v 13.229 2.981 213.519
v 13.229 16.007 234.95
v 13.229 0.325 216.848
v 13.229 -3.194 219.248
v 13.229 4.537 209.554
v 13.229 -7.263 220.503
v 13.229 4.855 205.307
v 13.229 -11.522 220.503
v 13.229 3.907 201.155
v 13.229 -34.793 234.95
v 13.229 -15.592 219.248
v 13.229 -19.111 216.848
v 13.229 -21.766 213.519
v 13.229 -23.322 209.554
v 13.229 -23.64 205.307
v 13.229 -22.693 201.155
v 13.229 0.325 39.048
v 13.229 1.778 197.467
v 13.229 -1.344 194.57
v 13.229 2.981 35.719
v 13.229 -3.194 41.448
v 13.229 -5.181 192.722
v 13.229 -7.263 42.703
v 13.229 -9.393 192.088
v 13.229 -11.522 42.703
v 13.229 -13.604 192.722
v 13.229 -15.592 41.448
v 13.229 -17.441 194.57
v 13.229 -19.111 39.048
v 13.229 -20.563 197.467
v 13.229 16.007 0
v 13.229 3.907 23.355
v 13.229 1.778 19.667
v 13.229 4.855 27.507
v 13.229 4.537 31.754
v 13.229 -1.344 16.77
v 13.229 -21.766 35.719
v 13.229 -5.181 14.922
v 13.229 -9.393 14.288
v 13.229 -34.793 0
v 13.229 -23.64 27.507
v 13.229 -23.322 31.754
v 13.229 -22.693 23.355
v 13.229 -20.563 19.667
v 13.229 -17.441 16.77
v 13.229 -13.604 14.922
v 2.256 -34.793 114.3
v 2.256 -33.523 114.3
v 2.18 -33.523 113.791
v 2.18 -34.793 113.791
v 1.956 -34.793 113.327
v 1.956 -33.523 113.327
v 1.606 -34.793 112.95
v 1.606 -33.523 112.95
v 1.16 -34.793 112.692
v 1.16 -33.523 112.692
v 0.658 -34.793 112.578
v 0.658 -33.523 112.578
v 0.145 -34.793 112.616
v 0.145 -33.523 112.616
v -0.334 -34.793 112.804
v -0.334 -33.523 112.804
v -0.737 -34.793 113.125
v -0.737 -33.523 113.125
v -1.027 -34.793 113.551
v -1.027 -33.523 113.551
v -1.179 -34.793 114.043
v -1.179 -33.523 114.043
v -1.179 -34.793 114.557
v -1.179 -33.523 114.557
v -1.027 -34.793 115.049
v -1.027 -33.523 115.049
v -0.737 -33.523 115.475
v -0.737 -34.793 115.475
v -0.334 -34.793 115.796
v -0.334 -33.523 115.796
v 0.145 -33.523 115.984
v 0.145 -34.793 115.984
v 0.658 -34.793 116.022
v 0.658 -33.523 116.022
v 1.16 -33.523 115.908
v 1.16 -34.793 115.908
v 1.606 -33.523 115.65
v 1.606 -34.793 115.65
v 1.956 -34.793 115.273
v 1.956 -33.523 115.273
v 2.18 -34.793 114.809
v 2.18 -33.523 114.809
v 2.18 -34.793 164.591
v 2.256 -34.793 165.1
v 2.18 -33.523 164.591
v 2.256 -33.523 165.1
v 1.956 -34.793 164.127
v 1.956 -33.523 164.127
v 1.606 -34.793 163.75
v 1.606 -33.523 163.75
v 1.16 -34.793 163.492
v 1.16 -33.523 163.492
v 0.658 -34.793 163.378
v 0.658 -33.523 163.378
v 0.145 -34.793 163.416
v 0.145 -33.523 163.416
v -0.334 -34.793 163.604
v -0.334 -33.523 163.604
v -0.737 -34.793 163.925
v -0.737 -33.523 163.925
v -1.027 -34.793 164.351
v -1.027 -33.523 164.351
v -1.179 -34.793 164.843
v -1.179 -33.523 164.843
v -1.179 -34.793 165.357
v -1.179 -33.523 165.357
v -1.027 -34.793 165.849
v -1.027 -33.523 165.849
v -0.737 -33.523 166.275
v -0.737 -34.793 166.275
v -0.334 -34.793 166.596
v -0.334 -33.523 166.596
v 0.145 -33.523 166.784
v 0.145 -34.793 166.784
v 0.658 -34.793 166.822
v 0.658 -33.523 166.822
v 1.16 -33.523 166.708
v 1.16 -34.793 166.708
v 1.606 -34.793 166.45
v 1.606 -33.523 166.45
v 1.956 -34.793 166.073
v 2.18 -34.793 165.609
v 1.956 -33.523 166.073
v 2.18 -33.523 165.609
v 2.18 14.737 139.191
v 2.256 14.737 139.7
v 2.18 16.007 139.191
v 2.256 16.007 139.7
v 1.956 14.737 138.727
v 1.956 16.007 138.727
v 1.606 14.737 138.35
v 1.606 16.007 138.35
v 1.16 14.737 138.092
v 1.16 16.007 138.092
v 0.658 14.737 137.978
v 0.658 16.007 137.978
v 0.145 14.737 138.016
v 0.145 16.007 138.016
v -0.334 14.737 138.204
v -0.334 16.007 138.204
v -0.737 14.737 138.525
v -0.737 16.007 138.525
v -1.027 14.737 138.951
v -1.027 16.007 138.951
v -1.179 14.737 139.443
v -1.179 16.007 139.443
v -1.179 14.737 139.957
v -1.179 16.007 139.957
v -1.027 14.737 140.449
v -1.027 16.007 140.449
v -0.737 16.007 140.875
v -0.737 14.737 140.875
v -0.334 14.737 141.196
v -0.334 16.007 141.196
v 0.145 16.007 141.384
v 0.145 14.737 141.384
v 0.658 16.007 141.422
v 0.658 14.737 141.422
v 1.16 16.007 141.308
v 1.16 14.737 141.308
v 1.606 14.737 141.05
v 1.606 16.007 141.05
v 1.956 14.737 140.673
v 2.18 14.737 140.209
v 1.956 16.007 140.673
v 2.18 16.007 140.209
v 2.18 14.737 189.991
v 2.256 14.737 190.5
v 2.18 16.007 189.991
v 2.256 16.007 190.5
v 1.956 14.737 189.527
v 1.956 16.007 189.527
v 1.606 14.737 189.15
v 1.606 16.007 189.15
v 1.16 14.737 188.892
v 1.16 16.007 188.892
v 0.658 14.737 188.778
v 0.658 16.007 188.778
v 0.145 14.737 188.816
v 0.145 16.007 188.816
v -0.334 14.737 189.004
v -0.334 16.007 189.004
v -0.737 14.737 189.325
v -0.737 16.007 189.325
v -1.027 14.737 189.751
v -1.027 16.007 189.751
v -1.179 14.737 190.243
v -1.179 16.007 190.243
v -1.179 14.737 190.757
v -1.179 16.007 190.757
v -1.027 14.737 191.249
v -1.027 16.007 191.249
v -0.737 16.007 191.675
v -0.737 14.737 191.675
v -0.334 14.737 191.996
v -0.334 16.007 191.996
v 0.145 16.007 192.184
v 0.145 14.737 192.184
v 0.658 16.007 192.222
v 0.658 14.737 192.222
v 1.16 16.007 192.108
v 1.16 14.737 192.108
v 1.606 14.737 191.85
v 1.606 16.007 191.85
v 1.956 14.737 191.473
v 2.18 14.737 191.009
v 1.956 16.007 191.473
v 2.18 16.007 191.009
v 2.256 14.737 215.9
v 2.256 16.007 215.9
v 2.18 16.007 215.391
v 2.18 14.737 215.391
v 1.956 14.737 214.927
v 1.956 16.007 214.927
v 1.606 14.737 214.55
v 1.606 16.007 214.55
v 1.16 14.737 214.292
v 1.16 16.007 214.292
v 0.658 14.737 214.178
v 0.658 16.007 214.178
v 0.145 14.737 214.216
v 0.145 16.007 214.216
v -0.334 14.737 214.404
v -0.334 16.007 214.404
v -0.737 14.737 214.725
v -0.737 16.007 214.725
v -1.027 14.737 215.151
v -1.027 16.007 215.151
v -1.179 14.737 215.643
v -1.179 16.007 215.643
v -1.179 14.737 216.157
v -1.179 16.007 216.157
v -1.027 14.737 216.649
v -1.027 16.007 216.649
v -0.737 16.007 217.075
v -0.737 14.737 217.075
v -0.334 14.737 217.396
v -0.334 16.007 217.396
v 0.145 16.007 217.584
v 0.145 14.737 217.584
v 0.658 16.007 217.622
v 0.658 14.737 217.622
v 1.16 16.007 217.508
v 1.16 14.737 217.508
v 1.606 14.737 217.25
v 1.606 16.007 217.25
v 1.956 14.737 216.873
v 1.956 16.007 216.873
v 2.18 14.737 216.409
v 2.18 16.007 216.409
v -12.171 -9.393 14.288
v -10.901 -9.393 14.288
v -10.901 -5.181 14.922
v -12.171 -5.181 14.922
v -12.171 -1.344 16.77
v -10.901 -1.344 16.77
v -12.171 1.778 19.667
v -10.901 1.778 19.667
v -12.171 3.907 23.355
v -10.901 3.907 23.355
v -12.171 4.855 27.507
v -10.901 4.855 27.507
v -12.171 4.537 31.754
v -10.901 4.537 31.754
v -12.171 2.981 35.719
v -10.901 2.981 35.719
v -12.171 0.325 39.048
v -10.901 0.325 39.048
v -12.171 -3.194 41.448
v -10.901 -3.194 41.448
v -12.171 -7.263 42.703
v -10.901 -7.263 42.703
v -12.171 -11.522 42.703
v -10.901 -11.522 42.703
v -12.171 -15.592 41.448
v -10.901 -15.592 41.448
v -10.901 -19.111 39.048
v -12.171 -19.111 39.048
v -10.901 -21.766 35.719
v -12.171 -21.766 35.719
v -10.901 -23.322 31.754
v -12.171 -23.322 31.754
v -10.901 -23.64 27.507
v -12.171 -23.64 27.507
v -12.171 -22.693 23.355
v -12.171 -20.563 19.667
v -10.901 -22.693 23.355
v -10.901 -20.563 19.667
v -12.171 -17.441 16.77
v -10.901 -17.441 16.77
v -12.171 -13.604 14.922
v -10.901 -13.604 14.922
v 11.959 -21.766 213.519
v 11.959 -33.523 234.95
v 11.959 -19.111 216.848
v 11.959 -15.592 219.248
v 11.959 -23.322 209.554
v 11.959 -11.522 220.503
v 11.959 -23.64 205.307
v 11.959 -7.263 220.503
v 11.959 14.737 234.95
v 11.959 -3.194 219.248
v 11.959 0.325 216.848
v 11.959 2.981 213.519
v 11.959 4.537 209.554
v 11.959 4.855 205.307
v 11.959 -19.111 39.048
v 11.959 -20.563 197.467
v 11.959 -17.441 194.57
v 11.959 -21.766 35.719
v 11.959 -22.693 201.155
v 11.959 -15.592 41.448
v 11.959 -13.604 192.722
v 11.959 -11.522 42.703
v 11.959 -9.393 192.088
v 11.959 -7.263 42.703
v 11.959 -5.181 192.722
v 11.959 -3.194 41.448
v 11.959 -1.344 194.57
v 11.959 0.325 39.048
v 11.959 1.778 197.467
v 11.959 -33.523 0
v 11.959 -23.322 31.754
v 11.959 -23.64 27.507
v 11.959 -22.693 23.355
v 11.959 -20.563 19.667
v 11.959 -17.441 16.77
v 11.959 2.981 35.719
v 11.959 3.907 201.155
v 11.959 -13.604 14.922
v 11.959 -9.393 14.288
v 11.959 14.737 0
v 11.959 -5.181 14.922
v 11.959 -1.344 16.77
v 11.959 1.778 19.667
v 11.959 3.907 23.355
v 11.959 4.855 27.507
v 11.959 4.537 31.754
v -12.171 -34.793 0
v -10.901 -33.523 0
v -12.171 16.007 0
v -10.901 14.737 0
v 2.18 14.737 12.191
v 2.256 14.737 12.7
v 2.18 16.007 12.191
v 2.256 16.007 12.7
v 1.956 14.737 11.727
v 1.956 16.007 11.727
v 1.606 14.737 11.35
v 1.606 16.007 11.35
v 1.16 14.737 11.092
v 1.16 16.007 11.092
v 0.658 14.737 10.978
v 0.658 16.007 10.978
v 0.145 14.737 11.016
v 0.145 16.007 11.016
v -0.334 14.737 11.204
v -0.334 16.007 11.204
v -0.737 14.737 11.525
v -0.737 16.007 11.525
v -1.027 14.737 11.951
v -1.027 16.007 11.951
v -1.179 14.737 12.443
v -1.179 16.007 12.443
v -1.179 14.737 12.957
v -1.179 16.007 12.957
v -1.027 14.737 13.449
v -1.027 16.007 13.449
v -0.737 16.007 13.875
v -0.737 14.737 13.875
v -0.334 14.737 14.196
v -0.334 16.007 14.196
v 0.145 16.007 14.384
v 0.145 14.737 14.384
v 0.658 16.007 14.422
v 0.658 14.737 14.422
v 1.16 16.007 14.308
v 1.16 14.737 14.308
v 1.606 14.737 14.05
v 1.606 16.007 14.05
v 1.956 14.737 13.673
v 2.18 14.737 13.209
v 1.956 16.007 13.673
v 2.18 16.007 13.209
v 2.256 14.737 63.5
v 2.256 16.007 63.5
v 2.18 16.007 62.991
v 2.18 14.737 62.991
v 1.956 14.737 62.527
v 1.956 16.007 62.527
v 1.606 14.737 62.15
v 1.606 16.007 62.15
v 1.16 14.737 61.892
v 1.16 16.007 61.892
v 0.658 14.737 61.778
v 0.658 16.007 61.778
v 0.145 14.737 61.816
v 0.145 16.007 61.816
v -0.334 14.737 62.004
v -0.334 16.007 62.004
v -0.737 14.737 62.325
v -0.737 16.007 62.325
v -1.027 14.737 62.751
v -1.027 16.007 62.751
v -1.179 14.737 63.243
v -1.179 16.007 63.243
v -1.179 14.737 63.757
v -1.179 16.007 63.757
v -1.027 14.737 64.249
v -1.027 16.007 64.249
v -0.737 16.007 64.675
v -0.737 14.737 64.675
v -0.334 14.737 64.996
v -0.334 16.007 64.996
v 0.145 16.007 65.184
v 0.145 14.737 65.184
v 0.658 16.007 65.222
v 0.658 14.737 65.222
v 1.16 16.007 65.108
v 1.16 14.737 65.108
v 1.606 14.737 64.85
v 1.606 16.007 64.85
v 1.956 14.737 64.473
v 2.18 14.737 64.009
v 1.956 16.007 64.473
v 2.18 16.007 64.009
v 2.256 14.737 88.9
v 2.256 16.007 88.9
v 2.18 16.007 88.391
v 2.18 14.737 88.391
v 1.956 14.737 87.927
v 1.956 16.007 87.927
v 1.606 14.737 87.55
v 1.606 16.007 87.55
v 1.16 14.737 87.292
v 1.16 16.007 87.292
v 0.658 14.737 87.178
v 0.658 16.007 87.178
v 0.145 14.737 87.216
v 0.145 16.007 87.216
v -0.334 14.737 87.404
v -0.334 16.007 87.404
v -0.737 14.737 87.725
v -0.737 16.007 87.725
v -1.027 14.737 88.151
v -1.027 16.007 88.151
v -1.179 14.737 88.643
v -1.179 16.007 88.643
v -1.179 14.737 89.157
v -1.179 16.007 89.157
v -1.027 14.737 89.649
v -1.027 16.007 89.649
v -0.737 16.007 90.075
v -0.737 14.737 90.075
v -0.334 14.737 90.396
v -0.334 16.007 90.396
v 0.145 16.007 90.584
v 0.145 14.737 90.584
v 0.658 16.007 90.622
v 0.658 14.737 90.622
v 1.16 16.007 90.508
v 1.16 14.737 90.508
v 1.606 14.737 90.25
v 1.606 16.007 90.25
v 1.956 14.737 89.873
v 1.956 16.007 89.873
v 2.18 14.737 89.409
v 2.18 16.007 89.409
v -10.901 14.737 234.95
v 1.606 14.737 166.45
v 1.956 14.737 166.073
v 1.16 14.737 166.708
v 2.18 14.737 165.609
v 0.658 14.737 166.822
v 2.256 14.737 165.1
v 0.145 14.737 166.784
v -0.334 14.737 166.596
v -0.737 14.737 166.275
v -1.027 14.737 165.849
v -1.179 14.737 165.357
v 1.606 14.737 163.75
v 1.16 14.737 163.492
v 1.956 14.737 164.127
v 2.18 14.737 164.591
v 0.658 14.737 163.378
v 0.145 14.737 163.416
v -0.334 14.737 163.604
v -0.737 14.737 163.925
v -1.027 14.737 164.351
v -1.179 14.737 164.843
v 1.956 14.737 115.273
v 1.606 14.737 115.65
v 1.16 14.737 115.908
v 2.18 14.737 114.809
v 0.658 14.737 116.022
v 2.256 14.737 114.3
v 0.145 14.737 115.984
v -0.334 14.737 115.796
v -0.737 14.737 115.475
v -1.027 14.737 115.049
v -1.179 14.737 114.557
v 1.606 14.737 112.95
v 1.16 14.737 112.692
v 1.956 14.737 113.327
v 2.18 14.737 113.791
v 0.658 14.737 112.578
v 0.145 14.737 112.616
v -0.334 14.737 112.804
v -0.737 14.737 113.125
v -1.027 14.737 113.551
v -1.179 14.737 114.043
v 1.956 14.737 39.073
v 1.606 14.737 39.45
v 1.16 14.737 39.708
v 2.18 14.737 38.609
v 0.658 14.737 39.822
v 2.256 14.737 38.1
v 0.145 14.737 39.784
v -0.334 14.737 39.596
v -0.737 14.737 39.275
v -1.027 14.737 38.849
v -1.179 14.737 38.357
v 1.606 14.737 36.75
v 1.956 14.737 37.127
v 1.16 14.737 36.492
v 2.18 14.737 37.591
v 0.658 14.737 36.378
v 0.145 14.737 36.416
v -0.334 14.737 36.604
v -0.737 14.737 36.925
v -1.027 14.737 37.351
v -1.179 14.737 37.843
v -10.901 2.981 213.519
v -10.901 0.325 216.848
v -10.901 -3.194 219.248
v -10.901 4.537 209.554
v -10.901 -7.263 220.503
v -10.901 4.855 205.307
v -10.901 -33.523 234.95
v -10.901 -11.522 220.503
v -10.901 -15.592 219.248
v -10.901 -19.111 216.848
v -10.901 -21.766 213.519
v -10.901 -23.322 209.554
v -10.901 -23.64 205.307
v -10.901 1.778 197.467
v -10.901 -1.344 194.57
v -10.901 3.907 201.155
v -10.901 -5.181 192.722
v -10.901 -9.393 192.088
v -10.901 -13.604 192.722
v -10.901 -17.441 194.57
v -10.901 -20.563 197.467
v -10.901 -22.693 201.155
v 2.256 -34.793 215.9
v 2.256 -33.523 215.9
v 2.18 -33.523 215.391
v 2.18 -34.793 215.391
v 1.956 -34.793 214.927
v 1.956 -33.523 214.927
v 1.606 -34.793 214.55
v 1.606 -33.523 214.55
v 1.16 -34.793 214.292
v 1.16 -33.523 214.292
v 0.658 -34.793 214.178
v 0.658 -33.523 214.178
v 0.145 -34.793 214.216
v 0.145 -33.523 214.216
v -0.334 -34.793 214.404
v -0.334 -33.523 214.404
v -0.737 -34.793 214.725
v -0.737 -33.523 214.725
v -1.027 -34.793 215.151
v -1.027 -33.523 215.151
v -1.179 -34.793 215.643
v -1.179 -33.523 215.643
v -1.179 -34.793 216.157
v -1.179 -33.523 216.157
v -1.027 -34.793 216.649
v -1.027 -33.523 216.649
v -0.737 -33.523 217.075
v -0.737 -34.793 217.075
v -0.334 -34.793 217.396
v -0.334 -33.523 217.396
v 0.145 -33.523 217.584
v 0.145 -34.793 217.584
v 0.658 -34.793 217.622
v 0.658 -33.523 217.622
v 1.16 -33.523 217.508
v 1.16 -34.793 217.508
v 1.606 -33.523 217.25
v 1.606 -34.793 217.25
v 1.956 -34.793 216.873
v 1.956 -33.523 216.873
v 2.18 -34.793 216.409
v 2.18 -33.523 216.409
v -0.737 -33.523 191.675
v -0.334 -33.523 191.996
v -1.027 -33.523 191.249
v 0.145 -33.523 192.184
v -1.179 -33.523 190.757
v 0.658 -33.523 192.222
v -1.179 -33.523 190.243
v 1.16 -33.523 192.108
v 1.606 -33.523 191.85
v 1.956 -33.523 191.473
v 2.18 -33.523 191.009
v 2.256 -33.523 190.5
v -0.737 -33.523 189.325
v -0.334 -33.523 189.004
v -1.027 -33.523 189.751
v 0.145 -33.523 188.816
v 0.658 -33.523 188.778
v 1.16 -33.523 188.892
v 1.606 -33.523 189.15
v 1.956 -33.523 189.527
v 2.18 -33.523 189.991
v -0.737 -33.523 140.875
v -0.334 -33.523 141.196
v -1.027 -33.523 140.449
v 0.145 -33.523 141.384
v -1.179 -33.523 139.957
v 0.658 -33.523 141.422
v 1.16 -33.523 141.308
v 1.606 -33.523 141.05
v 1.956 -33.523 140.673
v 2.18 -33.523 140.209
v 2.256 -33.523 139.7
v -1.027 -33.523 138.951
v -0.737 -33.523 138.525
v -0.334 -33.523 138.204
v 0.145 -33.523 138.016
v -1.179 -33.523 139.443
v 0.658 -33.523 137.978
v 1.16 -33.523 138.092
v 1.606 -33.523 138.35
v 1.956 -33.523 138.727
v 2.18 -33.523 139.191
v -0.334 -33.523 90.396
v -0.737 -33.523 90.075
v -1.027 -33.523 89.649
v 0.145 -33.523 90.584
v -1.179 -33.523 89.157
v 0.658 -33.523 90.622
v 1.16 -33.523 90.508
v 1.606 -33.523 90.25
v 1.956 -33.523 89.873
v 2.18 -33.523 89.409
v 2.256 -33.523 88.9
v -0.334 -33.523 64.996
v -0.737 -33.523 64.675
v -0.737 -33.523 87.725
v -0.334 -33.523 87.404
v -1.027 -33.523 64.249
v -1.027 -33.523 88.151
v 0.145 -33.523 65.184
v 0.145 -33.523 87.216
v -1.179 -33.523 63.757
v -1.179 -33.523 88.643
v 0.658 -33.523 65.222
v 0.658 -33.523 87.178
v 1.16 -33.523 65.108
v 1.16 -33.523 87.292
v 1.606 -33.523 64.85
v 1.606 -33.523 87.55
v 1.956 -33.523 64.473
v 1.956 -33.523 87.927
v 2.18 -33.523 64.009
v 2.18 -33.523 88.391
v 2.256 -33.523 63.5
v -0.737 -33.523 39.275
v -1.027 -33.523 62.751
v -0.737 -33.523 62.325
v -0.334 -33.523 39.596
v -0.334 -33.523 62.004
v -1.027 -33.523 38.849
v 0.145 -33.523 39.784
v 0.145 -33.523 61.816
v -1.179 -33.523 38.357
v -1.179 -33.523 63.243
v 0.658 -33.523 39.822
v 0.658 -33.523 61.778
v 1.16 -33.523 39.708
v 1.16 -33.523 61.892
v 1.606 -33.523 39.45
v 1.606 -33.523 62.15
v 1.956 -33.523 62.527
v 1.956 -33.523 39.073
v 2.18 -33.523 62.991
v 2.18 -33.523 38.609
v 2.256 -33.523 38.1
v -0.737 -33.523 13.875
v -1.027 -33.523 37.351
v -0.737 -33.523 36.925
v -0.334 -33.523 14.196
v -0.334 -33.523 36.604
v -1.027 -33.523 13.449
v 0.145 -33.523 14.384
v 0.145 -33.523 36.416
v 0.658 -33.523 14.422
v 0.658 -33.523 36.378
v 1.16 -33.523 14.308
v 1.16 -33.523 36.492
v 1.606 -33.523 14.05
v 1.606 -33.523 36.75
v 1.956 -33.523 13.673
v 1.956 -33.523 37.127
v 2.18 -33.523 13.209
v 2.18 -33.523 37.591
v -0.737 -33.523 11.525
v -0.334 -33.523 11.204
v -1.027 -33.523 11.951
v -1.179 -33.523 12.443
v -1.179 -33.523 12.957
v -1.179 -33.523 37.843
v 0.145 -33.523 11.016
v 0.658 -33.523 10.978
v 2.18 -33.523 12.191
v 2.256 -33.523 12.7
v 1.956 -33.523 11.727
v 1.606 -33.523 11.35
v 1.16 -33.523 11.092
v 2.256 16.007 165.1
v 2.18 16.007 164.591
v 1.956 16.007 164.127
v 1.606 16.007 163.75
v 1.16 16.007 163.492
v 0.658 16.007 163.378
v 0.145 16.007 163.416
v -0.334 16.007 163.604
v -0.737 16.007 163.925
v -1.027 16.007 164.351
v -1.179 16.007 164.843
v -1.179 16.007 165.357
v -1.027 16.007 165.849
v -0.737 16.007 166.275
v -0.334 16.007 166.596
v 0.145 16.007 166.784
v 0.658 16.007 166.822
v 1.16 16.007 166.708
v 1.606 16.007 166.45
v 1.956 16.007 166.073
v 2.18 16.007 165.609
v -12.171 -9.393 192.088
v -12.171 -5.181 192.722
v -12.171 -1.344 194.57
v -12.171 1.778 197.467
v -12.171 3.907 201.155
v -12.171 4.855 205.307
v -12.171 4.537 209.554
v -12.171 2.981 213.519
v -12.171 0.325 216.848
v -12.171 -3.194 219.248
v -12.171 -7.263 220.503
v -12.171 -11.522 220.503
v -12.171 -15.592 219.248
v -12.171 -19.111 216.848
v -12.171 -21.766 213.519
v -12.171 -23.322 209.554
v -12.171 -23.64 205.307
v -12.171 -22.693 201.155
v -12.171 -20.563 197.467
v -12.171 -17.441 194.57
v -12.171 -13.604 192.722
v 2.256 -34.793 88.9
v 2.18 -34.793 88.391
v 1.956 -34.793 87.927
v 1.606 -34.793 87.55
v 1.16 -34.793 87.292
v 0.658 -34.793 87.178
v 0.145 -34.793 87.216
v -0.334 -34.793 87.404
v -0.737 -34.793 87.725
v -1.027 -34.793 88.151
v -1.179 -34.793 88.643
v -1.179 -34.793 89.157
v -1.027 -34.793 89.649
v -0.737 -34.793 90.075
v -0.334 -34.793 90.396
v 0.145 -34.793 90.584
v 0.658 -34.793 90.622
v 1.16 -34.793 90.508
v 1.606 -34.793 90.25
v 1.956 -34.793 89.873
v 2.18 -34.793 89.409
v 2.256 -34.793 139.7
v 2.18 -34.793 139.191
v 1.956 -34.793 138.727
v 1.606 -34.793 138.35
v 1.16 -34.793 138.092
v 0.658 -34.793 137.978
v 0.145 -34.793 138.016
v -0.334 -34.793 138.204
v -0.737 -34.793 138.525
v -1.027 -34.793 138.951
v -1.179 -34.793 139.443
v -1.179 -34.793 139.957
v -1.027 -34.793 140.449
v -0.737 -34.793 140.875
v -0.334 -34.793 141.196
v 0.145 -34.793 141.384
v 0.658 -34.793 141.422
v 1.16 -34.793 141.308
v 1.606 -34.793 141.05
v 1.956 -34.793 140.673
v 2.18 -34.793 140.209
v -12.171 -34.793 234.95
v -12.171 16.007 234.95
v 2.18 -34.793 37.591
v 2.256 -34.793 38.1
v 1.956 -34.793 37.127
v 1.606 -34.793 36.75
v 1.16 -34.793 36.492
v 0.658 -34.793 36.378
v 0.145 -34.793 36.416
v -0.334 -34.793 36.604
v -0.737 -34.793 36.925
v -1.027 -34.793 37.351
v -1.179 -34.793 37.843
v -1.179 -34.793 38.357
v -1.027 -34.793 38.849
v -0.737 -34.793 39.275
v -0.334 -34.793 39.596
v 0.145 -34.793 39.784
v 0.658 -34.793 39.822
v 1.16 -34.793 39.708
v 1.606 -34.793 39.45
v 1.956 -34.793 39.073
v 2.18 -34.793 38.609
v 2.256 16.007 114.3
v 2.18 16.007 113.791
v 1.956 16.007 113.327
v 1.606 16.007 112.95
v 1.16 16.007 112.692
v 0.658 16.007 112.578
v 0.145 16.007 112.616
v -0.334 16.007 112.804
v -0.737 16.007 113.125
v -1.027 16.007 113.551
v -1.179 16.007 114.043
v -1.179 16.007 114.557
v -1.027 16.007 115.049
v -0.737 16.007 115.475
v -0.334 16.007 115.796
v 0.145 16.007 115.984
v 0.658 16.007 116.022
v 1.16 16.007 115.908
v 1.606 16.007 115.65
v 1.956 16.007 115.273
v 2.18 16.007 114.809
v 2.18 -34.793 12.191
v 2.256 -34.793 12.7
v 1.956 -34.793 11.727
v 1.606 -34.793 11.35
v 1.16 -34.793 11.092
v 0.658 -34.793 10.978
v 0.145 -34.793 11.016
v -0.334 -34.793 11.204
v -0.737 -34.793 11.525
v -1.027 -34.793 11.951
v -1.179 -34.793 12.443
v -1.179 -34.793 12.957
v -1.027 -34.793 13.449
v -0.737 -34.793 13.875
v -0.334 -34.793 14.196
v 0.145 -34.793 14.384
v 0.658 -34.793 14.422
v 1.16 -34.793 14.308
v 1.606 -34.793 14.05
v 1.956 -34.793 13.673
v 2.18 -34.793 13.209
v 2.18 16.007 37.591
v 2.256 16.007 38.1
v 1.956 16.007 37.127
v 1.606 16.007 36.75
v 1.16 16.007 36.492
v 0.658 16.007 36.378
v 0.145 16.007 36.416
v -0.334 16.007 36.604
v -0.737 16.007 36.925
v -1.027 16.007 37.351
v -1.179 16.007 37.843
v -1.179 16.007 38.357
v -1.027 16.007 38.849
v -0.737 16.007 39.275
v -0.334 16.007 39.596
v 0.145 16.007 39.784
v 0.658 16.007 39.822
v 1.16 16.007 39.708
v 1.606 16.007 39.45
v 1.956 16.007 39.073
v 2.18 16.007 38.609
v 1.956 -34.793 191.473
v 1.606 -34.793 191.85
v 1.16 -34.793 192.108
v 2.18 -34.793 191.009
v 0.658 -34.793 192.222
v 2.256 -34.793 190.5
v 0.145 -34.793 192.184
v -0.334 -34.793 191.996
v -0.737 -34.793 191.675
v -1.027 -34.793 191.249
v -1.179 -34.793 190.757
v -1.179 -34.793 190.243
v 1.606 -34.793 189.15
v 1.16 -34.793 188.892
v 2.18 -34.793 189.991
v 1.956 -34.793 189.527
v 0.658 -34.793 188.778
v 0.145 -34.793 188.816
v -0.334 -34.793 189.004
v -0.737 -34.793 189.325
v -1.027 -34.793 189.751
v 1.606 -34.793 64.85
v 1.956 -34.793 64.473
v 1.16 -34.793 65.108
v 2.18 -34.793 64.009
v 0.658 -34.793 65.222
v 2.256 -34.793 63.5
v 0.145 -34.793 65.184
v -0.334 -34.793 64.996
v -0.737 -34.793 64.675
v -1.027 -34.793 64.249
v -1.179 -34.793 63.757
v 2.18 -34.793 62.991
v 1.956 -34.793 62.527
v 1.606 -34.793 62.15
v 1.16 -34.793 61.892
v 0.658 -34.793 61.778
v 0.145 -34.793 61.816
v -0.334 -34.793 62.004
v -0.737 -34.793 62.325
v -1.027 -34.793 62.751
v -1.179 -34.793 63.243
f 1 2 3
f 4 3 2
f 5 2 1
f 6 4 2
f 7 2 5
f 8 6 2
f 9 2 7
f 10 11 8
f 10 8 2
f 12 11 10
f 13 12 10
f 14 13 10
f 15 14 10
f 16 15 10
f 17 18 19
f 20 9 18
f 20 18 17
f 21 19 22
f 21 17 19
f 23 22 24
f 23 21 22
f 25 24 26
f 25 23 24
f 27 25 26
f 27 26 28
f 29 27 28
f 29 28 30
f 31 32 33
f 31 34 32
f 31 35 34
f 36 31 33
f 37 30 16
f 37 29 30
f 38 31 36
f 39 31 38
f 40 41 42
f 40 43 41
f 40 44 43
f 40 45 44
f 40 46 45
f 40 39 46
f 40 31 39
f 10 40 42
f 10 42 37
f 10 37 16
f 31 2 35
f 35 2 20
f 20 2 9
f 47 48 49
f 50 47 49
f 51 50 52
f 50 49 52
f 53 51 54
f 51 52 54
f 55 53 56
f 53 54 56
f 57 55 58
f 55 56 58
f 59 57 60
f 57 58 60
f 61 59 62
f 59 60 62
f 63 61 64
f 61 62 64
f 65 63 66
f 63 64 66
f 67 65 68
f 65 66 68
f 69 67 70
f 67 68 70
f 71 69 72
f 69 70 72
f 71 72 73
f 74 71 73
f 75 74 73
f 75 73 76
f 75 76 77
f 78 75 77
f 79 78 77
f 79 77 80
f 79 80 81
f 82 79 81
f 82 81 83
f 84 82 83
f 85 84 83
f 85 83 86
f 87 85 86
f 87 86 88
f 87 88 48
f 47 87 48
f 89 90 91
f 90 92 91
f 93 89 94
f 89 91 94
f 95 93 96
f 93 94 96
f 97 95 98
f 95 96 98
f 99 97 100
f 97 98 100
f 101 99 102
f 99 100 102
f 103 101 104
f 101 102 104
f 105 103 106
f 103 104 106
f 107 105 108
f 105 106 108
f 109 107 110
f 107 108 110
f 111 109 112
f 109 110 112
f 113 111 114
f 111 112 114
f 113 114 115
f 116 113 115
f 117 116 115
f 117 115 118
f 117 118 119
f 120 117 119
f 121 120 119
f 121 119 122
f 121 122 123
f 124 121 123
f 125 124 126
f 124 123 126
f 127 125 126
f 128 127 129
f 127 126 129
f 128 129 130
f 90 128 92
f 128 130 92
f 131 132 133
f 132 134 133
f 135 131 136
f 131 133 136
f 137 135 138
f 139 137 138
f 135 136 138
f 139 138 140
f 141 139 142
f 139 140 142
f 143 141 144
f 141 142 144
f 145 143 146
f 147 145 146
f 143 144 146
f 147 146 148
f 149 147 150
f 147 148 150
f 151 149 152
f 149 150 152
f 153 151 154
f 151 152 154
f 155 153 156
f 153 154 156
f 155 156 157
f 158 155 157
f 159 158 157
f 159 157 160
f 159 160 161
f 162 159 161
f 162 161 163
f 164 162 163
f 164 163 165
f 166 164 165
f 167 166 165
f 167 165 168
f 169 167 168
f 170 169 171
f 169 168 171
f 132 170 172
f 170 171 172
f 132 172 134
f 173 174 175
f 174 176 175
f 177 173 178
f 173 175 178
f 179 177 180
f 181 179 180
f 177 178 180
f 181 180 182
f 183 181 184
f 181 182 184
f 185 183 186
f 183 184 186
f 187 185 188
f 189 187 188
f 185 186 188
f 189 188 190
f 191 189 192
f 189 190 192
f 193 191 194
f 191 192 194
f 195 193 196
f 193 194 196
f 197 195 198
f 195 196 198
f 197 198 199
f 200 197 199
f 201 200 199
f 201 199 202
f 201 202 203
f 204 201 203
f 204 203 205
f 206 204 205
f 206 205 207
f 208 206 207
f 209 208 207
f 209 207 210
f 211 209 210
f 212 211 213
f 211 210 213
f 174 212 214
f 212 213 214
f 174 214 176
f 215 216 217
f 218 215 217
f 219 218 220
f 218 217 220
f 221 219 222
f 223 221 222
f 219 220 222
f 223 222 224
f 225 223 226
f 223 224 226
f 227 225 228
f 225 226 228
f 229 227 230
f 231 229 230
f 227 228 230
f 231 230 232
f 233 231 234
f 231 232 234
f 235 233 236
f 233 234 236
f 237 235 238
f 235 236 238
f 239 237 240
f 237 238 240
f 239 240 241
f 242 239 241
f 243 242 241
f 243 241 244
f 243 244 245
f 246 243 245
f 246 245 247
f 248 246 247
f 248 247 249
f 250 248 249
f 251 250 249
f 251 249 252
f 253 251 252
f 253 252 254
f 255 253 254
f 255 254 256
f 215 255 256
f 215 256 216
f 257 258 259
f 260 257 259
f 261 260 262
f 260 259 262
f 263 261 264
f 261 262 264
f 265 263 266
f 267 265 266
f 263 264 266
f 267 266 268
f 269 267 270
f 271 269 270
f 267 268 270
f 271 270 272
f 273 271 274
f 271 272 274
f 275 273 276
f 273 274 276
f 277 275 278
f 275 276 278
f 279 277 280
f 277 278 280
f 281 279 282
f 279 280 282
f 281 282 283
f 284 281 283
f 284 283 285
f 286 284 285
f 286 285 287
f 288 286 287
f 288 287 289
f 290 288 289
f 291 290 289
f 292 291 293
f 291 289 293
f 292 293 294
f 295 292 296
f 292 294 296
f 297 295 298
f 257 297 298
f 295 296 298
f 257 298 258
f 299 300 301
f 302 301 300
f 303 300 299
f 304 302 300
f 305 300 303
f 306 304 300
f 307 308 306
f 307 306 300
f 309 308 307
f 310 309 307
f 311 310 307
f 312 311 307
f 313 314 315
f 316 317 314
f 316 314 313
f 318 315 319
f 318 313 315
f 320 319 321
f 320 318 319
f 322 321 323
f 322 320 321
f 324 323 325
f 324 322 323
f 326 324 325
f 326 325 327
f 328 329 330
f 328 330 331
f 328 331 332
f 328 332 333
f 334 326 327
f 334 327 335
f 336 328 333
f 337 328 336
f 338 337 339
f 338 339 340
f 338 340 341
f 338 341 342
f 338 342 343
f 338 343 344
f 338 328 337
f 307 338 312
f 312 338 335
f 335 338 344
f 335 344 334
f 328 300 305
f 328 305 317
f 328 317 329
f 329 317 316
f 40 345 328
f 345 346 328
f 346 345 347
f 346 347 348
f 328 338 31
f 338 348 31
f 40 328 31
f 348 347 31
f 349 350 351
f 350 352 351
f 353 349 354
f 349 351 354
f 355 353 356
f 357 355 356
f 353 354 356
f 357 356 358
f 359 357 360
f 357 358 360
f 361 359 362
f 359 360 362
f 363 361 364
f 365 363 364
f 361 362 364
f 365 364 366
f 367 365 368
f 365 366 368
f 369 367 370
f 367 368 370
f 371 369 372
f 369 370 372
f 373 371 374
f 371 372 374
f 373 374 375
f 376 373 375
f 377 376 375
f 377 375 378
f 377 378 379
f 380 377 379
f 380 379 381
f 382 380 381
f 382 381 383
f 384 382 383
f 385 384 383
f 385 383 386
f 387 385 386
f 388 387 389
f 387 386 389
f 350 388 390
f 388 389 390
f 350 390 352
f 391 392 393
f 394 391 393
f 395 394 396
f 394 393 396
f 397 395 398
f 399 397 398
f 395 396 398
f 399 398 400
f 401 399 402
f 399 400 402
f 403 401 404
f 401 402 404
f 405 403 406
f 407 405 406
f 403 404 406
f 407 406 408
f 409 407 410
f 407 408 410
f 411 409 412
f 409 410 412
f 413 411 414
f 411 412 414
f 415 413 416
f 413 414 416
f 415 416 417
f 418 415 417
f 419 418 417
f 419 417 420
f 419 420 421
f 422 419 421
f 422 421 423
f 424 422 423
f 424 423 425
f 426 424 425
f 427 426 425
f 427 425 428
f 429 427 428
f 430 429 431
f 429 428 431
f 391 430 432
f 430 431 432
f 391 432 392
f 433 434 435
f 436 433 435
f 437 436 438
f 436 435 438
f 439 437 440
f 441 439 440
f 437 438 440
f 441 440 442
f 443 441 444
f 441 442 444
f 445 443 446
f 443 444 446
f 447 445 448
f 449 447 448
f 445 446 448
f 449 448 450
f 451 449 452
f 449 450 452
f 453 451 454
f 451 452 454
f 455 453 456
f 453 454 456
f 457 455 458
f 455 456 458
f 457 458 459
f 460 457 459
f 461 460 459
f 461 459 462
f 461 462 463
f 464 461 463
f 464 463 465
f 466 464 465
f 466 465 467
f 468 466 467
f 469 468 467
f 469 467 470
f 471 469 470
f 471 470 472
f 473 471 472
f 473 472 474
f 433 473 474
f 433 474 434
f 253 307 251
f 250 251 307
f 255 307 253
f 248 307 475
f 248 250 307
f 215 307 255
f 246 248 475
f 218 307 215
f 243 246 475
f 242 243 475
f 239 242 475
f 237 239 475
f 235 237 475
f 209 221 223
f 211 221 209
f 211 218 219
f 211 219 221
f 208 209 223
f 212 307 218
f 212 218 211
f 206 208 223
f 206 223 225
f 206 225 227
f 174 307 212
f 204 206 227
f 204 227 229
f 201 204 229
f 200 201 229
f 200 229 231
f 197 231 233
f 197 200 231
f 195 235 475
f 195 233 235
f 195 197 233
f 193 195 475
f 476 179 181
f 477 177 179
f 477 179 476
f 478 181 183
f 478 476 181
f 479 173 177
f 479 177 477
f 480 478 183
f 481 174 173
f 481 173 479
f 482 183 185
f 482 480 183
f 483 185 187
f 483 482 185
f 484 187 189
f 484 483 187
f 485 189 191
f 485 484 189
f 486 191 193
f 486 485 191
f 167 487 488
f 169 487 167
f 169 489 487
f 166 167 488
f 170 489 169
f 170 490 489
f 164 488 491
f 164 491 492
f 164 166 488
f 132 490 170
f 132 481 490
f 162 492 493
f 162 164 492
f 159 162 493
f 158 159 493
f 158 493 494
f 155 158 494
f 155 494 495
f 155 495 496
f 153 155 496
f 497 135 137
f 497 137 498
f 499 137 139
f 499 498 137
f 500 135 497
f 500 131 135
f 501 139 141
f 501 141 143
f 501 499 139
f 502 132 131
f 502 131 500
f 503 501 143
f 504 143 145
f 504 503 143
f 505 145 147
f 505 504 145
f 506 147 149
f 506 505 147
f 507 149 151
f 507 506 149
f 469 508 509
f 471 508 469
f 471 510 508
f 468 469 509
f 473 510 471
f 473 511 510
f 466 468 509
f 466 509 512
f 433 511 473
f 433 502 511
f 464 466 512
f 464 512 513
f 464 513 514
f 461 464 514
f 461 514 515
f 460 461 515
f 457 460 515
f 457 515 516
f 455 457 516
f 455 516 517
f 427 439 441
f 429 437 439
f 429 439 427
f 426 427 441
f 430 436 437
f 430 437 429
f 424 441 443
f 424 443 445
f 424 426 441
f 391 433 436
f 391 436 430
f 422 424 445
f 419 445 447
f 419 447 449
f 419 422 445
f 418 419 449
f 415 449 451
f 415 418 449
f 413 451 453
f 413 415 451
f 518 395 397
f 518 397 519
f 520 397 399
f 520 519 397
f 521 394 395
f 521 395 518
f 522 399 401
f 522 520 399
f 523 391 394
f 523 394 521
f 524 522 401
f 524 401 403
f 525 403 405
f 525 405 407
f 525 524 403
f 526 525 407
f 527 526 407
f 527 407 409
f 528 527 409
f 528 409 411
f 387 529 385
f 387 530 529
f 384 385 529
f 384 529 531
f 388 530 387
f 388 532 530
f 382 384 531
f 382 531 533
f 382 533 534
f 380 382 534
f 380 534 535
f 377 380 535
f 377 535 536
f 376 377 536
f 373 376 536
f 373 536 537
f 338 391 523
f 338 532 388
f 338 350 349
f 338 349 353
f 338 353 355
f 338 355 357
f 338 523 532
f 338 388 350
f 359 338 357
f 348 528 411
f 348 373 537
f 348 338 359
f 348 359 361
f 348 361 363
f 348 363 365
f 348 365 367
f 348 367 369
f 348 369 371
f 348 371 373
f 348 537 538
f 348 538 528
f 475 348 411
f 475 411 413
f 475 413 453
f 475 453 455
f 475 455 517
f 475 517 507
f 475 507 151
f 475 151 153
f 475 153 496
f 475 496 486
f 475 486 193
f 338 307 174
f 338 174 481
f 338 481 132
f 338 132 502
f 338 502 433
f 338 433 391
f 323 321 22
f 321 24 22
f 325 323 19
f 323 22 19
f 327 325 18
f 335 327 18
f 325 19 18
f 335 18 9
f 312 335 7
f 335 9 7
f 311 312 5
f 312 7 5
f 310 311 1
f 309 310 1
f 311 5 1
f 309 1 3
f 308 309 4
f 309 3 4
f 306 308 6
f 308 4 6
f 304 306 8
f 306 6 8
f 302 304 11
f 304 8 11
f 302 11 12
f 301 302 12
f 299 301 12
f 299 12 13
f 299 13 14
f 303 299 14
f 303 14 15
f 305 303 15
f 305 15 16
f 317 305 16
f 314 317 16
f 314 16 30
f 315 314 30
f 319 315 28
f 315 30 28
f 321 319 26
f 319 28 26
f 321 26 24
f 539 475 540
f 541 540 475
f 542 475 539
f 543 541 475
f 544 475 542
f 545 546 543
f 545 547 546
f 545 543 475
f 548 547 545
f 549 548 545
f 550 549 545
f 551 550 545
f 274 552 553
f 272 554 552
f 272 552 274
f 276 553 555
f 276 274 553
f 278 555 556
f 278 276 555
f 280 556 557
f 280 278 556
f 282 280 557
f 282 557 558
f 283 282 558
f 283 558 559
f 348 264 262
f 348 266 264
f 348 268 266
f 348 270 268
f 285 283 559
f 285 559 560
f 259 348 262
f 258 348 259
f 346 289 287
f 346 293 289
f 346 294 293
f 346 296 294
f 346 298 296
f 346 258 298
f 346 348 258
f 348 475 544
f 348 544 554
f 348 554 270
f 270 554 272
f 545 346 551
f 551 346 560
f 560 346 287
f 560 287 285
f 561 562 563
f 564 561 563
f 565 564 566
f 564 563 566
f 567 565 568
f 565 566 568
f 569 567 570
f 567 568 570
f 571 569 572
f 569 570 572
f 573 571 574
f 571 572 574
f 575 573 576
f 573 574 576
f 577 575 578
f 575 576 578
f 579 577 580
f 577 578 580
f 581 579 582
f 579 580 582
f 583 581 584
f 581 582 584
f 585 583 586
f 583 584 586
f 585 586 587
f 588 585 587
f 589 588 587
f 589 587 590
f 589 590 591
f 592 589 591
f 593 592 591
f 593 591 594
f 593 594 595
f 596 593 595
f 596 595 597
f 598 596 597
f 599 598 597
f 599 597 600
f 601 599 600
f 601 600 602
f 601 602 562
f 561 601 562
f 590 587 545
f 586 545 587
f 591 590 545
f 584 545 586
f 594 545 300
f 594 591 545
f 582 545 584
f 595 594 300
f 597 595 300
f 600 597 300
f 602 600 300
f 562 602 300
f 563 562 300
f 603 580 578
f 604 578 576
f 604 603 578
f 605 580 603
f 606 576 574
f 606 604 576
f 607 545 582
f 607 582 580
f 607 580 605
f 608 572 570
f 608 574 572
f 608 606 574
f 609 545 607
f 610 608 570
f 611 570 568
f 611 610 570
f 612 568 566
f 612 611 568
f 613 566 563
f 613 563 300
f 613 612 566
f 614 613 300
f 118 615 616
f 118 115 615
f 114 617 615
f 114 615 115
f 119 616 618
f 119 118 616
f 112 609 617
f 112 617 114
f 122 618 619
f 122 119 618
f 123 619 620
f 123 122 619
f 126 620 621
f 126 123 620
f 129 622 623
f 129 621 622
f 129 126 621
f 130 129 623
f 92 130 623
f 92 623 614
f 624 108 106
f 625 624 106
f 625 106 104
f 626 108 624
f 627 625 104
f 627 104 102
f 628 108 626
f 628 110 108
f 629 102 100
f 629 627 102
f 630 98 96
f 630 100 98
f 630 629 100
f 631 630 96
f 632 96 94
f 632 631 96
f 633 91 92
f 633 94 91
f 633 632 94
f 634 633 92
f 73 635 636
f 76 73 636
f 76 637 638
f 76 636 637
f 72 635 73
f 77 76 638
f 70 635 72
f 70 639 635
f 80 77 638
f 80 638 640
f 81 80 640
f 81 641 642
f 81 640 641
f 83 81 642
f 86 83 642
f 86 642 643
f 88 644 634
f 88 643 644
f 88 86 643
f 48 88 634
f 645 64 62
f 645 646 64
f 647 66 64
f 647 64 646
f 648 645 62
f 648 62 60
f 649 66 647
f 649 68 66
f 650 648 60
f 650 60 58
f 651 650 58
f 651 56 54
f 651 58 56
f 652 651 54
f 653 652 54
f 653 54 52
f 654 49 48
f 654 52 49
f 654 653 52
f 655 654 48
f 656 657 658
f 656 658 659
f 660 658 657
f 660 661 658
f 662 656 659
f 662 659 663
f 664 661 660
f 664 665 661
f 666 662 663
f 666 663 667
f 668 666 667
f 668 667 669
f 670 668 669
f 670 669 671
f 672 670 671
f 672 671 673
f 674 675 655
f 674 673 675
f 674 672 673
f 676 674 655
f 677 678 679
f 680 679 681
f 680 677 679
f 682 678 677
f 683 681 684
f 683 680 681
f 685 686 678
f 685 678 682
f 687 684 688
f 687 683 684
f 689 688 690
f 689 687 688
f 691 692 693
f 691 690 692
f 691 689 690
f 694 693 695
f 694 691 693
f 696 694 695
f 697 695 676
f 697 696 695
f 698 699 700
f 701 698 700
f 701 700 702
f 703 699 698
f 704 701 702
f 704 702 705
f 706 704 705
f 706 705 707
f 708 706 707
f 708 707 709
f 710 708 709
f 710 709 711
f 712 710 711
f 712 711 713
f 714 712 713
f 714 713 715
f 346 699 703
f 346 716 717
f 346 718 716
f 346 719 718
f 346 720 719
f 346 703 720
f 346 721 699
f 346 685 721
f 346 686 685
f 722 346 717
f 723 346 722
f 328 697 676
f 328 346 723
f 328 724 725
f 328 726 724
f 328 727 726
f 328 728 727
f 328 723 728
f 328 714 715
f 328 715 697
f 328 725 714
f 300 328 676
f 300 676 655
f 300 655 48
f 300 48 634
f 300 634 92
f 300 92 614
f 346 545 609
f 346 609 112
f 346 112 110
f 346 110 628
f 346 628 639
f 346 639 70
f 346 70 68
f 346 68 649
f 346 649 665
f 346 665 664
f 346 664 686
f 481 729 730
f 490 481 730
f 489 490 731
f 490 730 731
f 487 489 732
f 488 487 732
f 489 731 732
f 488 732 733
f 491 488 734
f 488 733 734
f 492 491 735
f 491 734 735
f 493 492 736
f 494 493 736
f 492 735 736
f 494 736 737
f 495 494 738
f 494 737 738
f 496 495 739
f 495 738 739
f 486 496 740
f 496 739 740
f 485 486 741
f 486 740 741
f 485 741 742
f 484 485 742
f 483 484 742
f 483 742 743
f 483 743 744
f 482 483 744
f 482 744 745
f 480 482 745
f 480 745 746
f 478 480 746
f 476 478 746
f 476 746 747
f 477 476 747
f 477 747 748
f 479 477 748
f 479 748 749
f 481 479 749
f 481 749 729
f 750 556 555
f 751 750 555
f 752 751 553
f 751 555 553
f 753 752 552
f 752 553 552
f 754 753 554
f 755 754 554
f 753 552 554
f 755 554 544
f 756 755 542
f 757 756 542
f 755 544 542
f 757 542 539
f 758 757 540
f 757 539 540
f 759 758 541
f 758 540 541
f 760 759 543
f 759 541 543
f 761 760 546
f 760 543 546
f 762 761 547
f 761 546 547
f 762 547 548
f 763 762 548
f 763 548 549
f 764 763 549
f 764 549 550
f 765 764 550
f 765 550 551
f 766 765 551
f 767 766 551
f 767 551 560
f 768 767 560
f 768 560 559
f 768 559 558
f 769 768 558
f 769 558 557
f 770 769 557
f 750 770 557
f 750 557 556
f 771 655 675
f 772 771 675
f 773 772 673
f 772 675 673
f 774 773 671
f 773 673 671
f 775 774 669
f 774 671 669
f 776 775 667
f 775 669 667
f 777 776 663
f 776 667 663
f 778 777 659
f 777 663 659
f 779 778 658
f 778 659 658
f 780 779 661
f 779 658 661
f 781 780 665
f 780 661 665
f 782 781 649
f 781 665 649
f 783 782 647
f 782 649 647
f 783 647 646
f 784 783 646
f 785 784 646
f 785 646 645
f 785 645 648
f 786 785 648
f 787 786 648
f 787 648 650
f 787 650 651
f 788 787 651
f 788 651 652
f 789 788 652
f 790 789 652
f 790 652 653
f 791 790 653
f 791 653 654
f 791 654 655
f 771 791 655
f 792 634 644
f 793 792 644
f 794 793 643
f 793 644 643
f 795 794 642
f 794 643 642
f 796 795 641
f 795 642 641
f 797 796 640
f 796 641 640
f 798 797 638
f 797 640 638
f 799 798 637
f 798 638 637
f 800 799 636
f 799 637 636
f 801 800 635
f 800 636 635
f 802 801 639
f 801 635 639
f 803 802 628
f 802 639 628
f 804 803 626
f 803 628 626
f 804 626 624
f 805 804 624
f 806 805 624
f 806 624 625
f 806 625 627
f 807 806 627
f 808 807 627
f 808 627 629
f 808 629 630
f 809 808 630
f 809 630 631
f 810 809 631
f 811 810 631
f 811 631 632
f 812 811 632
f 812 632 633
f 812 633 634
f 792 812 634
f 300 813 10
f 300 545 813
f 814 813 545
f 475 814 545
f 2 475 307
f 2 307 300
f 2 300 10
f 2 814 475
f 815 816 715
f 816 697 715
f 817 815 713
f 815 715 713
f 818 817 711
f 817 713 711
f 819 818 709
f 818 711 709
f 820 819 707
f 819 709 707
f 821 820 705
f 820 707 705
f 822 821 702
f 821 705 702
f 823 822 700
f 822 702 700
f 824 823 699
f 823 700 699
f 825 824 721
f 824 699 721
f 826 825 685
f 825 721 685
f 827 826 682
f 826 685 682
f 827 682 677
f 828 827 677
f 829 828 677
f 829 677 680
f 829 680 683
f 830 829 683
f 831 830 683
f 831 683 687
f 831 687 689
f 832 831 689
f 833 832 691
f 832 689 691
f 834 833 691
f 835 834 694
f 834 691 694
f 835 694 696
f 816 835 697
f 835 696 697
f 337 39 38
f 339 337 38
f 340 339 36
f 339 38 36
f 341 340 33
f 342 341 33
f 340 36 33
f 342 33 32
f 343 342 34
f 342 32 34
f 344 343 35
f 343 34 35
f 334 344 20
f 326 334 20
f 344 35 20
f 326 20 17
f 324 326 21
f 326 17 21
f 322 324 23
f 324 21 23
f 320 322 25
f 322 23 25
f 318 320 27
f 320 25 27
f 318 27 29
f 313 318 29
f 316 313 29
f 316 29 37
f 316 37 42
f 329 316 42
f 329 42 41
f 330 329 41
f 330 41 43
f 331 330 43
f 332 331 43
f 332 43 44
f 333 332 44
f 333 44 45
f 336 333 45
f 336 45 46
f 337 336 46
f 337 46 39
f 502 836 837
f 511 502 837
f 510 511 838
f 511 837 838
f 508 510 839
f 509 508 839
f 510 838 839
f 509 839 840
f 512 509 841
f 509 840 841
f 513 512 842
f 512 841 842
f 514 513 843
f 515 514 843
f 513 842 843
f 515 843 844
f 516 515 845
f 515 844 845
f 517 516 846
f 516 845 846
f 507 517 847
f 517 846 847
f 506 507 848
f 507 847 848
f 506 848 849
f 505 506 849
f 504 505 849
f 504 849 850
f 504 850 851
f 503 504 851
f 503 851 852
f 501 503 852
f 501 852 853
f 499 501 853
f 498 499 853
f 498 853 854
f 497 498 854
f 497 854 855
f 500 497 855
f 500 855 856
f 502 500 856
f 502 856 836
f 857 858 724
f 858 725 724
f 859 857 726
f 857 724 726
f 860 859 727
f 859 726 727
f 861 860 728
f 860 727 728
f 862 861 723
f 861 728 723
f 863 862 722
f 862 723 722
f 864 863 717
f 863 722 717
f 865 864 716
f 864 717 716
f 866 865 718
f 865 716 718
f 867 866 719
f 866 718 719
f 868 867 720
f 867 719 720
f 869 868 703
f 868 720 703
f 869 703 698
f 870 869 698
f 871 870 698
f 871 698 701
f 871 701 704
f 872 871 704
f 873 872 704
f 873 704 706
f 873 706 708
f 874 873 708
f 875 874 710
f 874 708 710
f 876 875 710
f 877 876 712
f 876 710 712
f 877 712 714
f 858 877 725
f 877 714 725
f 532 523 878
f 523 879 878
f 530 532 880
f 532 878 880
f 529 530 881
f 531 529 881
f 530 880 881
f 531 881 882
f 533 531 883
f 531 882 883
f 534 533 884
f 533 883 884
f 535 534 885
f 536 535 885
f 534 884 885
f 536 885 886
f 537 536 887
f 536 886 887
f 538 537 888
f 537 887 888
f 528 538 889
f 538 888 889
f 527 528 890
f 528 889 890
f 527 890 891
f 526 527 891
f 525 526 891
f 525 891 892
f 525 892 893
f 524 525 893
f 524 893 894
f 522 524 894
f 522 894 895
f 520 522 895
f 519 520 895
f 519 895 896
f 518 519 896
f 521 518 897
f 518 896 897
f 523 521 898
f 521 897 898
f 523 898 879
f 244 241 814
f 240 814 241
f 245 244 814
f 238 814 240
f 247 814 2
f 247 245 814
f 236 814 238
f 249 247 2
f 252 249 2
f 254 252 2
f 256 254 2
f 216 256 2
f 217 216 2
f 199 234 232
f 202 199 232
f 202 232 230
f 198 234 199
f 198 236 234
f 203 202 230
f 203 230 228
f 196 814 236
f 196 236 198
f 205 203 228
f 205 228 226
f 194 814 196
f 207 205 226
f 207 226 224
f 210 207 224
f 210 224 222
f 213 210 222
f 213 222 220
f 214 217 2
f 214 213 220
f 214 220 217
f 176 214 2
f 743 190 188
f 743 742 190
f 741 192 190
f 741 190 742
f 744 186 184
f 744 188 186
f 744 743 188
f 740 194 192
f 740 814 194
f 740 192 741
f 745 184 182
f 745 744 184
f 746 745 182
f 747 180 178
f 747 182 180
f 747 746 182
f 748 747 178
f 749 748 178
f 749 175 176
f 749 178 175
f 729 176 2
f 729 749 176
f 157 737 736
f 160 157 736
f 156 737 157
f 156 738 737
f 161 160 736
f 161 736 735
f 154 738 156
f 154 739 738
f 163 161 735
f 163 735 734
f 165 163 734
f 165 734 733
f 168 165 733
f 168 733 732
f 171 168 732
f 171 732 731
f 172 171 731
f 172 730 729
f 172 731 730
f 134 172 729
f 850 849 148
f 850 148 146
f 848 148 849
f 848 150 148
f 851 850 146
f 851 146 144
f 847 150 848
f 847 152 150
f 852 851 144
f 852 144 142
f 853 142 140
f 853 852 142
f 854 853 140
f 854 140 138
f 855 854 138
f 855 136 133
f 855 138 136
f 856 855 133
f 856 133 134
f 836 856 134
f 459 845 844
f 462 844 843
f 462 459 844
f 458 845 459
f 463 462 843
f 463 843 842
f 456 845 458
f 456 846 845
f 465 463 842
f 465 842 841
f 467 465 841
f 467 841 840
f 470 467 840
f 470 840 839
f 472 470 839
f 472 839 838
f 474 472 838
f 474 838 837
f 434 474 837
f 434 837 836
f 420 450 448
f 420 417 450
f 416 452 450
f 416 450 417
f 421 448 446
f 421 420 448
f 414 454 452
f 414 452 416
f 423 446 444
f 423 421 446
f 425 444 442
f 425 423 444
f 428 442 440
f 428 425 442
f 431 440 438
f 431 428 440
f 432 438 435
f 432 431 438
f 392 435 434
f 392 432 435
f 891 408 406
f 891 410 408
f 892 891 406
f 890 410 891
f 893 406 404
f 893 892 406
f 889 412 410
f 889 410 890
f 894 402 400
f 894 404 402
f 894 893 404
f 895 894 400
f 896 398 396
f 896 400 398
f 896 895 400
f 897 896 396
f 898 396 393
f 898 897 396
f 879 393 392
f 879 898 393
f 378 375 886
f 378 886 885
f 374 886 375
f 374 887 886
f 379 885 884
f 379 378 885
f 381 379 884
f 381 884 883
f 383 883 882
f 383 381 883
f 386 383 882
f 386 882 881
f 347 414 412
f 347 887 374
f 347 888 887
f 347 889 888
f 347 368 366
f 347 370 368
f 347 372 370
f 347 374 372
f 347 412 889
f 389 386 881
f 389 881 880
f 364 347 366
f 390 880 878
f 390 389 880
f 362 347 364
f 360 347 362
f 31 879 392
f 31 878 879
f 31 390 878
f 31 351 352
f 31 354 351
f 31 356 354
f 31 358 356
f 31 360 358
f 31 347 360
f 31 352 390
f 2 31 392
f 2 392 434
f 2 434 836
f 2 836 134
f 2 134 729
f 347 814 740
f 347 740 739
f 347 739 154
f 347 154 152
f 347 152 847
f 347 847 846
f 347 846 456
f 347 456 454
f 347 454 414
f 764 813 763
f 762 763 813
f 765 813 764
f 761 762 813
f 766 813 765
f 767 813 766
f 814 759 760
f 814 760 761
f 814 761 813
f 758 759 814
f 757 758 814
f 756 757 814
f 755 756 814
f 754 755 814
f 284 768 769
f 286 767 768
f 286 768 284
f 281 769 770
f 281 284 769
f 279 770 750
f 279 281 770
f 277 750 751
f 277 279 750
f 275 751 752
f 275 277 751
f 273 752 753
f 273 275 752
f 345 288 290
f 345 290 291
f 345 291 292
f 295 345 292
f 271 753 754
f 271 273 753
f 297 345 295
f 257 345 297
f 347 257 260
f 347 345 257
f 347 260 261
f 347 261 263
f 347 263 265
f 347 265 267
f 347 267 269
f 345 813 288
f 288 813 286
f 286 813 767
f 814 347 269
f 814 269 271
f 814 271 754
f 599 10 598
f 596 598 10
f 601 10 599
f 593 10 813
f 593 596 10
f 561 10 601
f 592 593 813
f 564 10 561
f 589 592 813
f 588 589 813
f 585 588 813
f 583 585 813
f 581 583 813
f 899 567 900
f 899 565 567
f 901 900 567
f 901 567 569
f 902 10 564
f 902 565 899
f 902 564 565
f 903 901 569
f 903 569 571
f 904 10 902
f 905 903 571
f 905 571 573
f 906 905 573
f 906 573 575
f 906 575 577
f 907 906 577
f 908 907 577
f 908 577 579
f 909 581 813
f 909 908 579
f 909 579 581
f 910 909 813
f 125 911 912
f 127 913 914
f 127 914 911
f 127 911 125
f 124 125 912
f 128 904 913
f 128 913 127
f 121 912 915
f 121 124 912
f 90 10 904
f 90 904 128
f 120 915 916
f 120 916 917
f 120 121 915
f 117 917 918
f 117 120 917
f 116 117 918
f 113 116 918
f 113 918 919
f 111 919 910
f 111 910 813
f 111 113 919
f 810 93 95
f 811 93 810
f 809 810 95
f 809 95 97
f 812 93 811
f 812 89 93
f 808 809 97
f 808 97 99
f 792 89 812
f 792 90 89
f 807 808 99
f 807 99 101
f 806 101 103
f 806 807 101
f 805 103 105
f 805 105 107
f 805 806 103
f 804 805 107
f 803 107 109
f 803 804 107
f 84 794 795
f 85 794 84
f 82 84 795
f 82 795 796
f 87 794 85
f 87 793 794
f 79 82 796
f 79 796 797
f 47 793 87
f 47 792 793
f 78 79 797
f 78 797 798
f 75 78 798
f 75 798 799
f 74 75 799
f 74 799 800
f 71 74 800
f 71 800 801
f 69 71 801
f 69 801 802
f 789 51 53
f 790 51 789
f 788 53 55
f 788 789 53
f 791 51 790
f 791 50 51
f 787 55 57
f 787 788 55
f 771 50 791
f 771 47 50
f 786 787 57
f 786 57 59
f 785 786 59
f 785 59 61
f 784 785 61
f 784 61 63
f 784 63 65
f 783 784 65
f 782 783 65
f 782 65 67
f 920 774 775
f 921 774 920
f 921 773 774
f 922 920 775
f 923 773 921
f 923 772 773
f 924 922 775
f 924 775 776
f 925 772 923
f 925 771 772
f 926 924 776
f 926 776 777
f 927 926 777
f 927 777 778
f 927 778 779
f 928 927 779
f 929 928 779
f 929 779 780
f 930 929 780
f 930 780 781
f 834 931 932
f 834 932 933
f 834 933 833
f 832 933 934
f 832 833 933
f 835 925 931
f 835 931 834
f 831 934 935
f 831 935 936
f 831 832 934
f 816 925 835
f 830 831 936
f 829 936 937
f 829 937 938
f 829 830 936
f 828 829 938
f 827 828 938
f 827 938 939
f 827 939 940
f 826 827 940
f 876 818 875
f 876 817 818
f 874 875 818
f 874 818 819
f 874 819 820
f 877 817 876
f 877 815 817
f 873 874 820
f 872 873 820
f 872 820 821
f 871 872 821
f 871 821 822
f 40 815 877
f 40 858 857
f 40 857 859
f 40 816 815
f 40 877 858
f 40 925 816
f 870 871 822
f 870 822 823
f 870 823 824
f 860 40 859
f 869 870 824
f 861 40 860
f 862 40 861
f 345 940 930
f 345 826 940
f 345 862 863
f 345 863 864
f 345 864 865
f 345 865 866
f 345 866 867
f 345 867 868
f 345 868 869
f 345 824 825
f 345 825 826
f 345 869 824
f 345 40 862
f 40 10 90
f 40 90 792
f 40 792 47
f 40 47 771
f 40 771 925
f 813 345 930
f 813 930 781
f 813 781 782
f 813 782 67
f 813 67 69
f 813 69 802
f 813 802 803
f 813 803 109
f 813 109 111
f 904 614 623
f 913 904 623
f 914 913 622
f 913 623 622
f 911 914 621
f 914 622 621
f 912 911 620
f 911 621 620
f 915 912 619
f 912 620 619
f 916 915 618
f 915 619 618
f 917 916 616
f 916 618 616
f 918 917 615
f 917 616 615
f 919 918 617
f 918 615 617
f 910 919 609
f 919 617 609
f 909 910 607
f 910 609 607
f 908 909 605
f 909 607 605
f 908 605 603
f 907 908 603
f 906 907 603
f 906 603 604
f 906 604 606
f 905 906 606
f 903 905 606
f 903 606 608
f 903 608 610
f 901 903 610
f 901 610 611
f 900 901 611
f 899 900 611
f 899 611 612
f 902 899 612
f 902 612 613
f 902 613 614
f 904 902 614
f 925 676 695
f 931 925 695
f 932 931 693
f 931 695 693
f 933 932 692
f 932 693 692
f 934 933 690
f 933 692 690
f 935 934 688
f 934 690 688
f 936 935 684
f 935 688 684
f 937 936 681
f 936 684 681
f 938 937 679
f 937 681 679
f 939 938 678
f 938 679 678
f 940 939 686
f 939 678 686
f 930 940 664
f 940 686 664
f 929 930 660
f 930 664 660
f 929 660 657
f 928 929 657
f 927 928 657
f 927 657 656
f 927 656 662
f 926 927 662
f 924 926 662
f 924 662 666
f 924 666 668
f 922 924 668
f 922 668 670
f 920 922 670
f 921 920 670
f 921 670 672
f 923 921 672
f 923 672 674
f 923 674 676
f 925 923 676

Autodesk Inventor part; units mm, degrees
ref_plane "YZ Plane" through (0, 0, 0) normal (1, 0, 0) x (0, 1, 0)
ref_plane "XZ Plane" through (0, 0, 0) normal (0, 1, 0) x (-1, 0, 0)
ref_plane "XY Plane" through (0, 0, 0) normal (0, 0, 1) x (1, 0, 0)
sketch "Sketch1" plane through (0, 0, 0) normal (0, 0, 1) x (1, 0, 0)
  line L0 (-12.1708, 16.0073) -> (13.2292, 16.0073)
  line L1 (13.2292, 16.0073) -> (13.2292, -34.7927)
  line L2 (13.2292, -34.7927) -> (-12.1708, -34.7927)
  line L3 (-12.1708, -34.7927) -> (-12.1708, 16.0073)
  line L4 (11.9592, 14.7373) -> (-10.9008, 14.7373)
  line L5 (-10.9008, 14.7373) -> (-10.9008, -33.5227)
  line L6 (-10.9008, -33.5227) -> (11.9592, -33.5227)
  line L7 (11.9592, -33.5227) -> (11.9592, 14.7373)
  point P0 (0, 0)
  dimension "d0" = 25.4
  dimension "d1" = 50.8
  dimension "d2" = 1.27
extrude "Extrusion1" add sketch "Sketch1" along normal blind 234.95
sketch "Sketch2" plane through (-12.1708, 16.0073, 0) normal (0, 1, 0) x (1, 0, 0)
  circle A0 centre (12.7, -12.7) radius 1.7272
  line L0 (25.4, 0) -> (0, 0) projected
  line L1 (0, 0) -> (0, -234.95) projected
  point P0 (12.1708, 0)
  dimension "d5" = 3.4544
  dimension "d6" = 12.7
  dimension "d7" = 12.7
extrude "Extrusion2" cut sketch "Sketch2" against normal through all
pattern_linear "Rectangular Pattern1" count 23 spacing 25.4 along (0, 0, 1) of "Extrusion2"
sketch "Sketch5" plane through (13.2292, -34.7927, 0) normal (1, 0, 0) x (0, 0, -1)
  circle A0 centre (-206.375, 25.4) radius 14.2875
  line L0 (-234.95, 0) -> (-234.95, 50.8) projected
  line L1 (0, 50.8) -> (-234.95, 50.8) projected
  circle A1 centre (-28.575, 25.4) radius 14.2875
  point P0 (0, 34.7927)
  dimension "d46" = 28.575
  dimension "d47" = 28.575
  dimension "d48" = 25.4
  dimension "d52" = 28.575
  dimension "d54" = 25.4
  dimension "d61" = 28.575
extrude "Extrusion5" cut sketch "Sketch5" against normal through all
equation "\"d3\" = d13"
equation "\"d10\" = d14"
equation "\"d13\" = 234.95"
equation "\"d14\" = d13"
equation "\"d32\" = 101.6"
properties part number "AIntakeArm2"
